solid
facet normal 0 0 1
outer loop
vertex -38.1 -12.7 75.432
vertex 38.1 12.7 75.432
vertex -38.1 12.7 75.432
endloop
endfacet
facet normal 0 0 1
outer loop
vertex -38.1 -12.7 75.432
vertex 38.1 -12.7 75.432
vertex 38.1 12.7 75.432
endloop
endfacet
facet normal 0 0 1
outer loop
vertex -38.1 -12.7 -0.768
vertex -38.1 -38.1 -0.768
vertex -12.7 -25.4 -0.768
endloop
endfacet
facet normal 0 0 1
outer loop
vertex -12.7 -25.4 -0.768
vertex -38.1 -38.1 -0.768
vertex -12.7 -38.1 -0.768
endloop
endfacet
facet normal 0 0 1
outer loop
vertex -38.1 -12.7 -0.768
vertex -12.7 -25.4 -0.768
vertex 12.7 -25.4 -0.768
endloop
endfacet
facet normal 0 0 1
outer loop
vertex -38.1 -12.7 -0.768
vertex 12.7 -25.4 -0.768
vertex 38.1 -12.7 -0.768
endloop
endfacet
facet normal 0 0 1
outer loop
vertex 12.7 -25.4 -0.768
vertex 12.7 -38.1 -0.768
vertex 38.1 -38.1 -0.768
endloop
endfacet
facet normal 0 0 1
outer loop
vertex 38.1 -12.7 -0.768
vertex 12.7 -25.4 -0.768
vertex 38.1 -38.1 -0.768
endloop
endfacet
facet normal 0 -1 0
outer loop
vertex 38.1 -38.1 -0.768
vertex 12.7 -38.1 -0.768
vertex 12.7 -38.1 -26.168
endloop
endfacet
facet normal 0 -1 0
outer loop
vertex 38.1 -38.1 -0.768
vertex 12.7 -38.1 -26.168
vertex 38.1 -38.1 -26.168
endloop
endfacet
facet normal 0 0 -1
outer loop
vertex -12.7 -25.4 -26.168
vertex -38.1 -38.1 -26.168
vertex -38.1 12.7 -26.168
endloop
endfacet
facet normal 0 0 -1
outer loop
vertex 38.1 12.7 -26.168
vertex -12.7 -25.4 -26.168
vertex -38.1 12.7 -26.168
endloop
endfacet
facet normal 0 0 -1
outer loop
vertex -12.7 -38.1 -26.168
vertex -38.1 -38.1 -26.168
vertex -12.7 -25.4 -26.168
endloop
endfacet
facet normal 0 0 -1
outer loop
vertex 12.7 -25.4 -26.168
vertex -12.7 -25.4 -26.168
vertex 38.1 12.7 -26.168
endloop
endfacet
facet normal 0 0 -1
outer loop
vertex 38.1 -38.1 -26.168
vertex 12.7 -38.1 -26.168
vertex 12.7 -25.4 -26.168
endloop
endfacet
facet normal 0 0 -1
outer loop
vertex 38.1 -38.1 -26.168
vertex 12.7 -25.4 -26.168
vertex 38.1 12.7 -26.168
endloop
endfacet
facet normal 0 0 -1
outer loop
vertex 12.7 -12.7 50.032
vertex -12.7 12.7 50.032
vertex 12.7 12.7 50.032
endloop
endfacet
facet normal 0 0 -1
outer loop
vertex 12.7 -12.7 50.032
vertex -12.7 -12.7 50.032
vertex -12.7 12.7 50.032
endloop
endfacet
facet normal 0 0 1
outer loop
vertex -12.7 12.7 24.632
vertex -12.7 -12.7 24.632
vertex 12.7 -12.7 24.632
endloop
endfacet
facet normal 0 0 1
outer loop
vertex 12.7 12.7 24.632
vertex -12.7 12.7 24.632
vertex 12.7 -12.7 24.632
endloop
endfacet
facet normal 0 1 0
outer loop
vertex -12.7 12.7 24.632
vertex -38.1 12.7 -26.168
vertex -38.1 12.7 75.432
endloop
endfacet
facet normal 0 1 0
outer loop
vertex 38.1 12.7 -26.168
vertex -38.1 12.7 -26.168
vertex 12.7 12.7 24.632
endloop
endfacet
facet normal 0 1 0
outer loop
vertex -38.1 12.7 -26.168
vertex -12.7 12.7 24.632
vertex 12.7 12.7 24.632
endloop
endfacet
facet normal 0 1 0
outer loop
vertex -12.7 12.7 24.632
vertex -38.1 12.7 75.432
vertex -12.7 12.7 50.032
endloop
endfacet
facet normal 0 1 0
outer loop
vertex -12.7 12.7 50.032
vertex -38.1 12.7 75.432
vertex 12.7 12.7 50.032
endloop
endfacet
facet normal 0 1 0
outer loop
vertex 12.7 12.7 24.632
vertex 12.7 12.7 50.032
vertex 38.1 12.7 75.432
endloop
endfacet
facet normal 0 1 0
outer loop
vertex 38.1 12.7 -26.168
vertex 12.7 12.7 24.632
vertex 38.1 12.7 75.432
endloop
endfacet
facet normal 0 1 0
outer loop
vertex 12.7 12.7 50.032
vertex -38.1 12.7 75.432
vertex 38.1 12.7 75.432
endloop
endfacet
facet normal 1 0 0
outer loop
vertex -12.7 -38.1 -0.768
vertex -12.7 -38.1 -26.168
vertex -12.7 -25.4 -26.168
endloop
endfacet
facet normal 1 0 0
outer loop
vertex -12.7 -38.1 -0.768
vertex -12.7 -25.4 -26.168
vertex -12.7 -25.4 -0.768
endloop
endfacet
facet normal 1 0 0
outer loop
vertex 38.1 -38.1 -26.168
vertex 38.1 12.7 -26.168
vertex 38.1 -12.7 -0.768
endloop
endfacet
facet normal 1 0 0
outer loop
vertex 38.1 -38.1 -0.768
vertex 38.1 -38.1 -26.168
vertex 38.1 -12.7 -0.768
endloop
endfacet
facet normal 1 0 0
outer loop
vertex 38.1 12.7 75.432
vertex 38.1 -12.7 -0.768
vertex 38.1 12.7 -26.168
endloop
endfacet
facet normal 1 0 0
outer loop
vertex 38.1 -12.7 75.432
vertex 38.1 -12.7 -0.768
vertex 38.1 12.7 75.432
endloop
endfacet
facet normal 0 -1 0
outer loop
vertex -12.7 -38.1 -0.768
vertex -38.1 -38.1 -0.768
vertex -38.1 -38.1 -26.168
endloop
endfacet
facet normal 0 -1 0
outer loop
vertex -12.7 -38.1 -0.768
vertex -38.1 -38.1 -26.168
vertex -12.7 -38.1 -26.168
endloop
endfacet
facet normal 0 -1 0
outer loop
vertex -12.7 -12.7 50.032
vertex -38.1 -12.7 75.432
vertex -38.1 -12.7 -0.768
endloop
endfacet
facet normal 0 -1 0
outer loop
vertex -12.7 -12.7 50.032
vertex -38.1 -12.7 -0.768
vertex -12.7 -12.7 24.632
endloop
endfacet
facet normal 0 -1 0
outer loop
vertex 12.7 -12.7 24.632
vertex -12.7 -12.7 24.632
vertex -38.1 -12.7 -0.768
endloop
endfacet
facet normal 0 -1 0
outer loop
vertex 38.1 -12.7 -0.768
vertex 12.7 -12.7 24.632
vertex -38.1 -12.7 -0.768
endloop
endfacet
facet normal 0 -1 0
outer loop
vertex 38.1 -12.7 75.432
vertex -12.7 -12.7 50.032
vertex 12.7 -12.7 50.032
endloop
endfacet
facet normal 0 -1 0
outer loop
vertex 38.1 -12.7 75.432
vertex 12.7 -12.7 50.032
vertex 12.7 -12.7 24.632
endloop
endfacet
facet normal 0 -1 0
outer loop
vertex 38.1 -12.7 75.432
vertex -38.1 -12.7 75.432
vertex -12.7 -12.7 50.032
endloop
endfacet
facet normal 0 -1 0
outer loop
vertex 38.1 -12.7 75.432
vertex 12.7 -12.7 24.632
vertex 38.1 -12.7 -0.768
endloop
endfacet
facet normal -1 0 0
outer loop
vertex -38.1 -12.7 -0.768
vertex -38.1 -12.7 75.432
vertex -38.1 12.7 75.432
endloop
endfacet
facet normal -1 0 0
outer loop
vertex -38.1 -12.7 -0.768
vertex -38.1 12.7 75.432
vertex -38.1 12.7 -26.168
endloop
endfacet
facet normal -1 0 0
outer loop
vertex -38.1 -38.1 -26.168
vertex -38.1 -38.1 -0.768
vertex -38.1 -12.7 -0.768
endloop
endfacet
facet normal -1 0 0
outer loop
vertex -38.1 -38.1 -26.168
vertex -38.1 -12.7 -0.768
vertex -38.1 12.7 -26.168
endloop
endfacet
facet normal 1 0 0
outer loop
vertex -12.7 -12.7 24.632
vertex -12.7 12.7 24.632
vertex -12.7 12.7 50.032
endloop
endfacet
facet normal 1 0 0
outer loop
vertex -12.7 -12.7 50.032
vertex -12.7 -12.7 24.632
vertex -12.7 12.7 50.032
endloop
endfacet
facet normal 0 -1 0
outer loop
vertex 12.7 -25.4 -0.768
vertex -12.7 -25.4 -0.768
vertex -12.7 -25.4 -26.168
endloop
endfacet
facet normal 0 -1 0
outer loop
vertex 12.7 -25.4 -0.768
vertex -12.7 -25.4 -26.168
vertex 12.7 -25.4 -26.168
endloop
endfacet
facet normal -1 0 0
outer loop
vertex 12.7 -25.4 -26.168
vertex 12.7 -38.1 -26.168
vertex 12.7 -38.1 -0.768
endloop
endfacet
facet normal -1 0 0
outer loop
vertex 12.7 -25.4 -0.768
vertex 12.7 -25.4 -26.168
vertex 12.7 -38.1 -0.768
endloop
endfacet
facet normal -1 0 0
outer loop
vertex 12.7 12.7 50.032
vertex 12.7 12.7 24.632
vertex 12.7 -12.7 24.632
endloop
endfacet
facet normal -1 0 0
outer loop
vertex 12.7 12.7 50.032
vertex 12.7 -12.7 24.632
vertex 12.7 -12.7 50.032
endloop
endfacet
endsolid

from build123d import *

# Parameters (mm, degrees)
F0_W     = 25.4
F0_H     = 25.4
F1_DEPTH = 38.1
F2_DEPTH = 12.7
F3_DEPTH = 25.4
F4_DEPTH = 12.7
F5_DEPTH = 12.7


with BuildPart() as f1:
    # F0 (on Front) → F1 (new body)
    with BuildSketch(Plane.XZ):
        with Locations((-25.4, -13.468404)):
            Rectangle(F0_W, F0_H)
        with Locations((25.4, -13.468404)):
            Rectangle(F0_W, F0_H)
    extrude(amount=F1_DEPTH)

    # F0 (on Front) → F2 (join)
    with BuildSketch(Plane.XZ):
        with Locations((25.4, -13.468404)):
            Rectangle(F0_W, F0_H)
        with Locations((-25.4, -13.468404)):
            Rectangle(F0_W, F0_H)
    extrude(amount=-F2_DEPTH)

    # F0 (on Front) → F3 (join)
    with BuildSketch(Plane.XZ):
        with Locations((0, -13.468404)):
            Rectangle(F0_W, F0_H)
    extrude(amount=F3_DEPTH)

    # F0 (on Front) → F4 (join)
    with BuildSketch(Plane.XZ):
        with Locations((0, -13.468404)):
            Rectangle(F0_W, F0_H)
    extrude(amount=-F4_DEPTH)

    # F0 (on Front) → F5 (join, symmetric)
    with BuildSketch(Plane.XZ):
        Polygon((38.1, 75.431596), (-38.1, 75.431596), (-38.1, -0.768404), (-12.7, -0.768404), (12.7, -0.768404), (38.1, -0.768404), align=None)
        with Locations((0, 37.331596)):
            Rectangle(F0_W, F0_H, mode=Mode.SUBTRACT)
    extrude(amount=F5_DEPTH, both=True)


solid = f1.part
